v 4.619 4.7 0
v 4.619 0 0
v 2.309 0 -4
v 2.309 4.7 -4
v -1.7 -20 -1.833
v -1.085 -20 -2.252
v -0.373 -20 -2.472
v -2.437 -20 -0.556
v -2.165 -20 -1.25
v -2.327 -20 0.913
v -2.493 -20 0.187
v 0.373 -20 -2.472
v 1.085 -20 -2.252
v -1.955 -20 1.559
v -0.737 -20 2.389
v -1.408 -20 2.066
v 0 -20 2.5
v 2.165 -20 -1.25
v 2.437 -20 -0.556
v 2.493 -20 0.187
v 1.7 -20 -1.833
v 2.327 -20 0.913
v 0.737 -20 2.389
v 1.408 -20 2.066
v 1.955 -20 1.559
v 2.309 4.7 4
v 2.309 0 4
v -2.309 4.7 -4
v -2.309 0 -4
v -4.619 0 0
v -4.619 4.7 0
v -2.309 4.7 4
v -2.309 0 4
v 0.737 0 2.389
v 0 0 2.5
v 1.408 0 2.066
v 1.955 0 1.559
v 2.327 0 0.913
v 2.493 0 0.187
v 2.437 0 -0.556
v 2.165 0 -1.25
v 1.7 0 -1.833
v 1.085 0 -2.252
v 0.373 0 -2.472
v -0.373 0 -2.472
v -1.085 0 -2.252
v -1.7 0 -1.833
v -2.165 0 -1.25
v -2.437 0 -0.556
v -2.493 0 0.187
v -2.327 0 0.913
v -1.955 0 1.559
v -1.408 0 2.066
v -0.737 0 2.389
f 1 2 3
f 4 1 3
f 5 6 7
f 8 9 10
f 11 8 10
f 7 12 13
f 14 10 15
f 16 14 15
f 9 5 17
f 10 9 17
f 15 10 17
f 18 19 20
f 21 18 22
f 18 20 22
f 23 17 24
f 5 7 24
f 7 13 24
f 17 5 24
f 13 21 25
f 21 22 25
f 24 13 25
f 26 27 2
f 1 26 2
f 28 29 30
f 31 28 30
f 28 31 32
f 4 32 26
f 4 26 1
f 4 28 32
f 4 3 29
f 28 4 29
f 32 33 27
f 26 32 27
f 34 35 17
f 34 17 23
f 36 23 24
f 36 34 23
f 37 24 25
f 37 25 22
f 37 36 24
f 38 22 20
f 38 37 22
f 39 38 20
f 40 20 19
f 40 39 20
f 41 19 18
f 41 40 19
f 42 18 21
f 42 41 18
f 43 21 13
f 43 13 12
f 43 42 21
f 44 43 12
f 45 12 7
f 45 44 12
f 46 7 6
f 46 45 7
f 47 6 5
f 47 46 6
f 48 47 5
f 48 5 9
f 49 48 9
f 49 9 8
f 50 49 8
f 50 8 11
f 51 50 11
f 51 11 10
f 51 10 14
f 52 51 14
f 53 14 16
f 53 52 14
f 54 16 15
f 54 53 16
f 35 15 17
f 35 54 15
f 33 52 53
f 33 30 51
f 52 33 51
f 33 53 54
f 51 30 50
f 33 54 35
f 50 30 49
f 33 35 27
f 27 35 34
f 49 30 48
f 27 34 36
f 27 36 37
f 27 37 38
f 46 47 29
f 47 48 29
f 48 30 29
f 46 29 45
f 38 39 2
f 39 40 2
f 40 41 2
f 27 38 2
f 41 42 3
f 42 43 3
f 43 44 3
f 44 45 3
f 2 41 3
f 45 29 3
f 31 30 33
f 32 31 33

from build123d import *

# Parameters (mm, degrees)
HEAD_DEPTH = 4.7
SKBODY_R   = 2.5
BODY_DEPTH = 20


with BuildPart() as part:
    # skHead → Head (new body)
    with BuildSketch(Plane(origin=(0, 0, 0), x_dir=(1, 0, 0), z_dir=(0, 1, 0))):
        Polygon((4.618802154, 0), (2.309401077, 4), (-2.309401077, 4), (-4.618802154, 0), (-2.309401077, -4), (2.309401077, -4), align=None)
    extrude(amount=HEAD_DEPTH)

    # skBody → Body (add)
    with BuildSketch(Plane(origin=(0, 0, 0), x_dir=(1, 0, 0), z_dir=(0, 1, 0))):
        Circle(SKBODY_R)
    extrude(amount=-BODY_DEPTH)


solid = part.part
